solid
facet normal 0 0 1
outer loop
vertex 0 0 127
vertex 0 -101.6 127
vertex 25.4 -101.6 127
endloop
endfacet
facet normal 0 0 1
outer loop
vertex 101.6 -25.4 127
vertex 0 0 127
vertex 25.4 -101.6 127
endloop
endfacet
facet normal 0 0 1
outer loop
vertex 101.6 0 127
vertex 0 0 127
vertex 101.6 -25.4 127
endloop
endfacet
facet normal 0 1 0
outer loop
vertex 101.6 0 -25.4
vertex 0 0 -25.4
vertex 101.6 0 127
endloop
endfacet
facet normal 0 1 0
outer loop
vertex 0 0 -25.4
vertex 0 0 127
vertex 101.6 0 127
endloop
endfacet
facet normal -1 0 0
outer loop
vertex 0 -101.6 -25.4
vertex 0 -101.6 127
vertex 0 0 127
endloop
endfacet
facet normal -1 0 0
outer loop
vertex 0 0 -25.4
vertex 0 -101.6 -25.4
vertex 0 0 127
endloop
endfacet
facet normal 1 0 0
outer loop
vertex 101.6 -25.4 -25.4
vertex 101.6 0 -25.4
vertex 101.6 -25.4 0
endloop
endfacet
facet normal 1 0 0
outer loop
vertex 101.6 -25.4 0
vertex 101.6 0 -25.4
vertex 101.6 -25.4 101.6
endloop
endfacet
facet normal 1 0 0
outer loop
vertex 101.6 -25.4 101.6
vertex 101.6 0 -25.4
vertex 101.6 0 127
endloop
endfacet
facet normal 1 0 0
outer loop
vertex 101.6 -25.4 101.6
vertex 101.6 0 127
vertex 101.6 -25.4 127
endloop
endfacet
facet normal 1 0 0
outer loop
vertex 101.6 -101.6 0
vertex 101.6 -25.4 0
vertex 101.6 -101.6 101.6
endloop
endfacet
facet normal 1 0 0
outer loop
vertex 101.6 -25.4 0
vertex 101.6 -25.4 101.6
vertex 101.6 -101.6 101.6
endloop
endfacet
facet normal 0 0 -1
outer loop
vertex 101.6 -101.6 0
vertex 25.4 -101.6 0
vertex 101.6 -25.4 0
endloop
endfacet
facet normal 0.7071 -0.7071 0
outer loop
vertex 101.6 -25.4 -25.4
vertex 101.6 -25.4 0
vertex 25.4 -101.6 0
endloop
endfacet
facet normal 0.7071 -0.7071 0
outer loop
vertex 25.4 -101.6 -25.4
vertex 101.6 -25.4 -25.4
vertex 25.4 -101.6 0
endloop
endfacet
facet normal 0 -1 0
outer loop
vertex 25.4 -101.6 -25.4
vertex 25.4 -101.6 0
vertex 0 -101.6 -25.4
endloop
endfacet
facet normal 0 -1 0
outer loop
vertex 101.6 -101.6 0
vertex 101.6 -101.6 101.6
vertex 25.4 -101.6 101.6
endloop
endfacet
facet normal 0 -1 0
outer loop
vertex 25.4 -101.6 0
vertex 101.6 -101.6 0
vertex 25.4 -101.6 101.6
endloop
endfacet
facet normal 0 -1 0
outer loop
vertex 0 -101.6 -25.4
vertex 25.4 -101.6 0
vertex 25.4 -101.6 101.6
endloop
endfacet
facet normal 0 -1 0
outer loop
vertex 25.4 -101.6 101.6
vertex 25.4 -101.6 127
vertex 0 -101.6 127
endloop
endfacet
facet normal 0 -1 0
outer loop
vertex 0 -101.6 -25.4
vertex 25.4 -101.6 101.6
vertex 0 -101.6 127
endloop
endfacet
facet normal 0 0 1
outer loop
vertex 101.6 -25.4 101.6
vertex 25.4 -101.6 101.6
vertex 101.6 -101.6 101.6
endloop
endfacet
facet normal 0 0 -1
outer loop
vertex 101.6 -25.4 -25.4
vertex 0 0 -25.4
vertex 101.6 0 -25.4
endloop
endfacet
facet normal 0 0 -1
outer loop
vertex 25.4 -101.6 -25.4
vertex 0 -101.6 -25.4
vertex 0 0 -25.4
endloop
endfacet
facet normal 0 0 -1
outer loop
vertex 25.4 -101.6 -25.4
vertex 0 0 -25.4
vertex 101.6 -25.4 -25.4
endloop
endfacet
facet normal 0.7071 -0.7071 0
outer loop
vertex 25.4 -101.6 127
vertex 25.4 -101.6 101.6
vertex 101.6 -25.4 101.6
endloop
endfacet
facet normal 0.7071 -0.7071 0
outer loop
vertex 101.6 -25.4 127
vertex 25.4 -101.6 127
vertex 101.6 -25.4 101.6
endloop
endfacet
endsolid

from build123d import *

# Parameters (mm, degrees)
F0_W      = 101.6
F0_H      = 101.6
F1_DEPTH  = 101.6
F3_W      = 101.6
F3_H      = 25.4
F4_DEPTH  = 25.4
F5_W      = 25.4
F5_H      = 76.2
F6_DEPTH  = 25.4
F8_DEPTH  = 25.4
F10_DEPTH = 25.4


with BuildPart() as f1:
    # F0 (on Top) → F1 (new body)
    with BuildSketch(Plane.XY):
        with Locations((50.8, -50.8)):
            Rectangle(F0_W, F0_H)
    extrude(amount=F1_DEPTH)

    # F3 (on face) → F4 (join)
    with BuildSketch(Plane.XY.offset(101.6)):
        with Locations((50.8, -12.7)):
            Rectangle(F3_W, F3_H)
    extrude(amount=F4_DEPTH)

    # F5 (on face) → F6 (join)
    with BuildSketch(Plane.XY.offset(101.6)):
        with Locations((12.7, -63.207563)):
            Rectangle(F5_W, F5_H)
    extrude(amount=F6_DEPTH)

    # F7 (on face) → F8 (join)
    with BuildSketch(Plane.XY.offset(101.6)):
        Polygon((101.6, 0), (0, 0), (0, -101.6), (25.4, -101.6), (25.4, -25.4), (101.6, -25.4), align=None)
        Polygon((25.4, -101.6), (101.6, -25.4), (25.4, -25.4), align=None)
    extrude(amount=F8_DEPTH)

    # F9 (on face) → F10 (join)
    with BuildSketch(Plane(origin=(0, 0, 0), x_dir=(1, 0, 0), z_dir=(0, 0, -1))):
        Polygon((0, 101.6), (0, 0), (101.6, 0), (101.6, 25.4), (25.4, 101.6), align=None)
    extrude(amount=F10_DEPTH)


solid = f1.part
